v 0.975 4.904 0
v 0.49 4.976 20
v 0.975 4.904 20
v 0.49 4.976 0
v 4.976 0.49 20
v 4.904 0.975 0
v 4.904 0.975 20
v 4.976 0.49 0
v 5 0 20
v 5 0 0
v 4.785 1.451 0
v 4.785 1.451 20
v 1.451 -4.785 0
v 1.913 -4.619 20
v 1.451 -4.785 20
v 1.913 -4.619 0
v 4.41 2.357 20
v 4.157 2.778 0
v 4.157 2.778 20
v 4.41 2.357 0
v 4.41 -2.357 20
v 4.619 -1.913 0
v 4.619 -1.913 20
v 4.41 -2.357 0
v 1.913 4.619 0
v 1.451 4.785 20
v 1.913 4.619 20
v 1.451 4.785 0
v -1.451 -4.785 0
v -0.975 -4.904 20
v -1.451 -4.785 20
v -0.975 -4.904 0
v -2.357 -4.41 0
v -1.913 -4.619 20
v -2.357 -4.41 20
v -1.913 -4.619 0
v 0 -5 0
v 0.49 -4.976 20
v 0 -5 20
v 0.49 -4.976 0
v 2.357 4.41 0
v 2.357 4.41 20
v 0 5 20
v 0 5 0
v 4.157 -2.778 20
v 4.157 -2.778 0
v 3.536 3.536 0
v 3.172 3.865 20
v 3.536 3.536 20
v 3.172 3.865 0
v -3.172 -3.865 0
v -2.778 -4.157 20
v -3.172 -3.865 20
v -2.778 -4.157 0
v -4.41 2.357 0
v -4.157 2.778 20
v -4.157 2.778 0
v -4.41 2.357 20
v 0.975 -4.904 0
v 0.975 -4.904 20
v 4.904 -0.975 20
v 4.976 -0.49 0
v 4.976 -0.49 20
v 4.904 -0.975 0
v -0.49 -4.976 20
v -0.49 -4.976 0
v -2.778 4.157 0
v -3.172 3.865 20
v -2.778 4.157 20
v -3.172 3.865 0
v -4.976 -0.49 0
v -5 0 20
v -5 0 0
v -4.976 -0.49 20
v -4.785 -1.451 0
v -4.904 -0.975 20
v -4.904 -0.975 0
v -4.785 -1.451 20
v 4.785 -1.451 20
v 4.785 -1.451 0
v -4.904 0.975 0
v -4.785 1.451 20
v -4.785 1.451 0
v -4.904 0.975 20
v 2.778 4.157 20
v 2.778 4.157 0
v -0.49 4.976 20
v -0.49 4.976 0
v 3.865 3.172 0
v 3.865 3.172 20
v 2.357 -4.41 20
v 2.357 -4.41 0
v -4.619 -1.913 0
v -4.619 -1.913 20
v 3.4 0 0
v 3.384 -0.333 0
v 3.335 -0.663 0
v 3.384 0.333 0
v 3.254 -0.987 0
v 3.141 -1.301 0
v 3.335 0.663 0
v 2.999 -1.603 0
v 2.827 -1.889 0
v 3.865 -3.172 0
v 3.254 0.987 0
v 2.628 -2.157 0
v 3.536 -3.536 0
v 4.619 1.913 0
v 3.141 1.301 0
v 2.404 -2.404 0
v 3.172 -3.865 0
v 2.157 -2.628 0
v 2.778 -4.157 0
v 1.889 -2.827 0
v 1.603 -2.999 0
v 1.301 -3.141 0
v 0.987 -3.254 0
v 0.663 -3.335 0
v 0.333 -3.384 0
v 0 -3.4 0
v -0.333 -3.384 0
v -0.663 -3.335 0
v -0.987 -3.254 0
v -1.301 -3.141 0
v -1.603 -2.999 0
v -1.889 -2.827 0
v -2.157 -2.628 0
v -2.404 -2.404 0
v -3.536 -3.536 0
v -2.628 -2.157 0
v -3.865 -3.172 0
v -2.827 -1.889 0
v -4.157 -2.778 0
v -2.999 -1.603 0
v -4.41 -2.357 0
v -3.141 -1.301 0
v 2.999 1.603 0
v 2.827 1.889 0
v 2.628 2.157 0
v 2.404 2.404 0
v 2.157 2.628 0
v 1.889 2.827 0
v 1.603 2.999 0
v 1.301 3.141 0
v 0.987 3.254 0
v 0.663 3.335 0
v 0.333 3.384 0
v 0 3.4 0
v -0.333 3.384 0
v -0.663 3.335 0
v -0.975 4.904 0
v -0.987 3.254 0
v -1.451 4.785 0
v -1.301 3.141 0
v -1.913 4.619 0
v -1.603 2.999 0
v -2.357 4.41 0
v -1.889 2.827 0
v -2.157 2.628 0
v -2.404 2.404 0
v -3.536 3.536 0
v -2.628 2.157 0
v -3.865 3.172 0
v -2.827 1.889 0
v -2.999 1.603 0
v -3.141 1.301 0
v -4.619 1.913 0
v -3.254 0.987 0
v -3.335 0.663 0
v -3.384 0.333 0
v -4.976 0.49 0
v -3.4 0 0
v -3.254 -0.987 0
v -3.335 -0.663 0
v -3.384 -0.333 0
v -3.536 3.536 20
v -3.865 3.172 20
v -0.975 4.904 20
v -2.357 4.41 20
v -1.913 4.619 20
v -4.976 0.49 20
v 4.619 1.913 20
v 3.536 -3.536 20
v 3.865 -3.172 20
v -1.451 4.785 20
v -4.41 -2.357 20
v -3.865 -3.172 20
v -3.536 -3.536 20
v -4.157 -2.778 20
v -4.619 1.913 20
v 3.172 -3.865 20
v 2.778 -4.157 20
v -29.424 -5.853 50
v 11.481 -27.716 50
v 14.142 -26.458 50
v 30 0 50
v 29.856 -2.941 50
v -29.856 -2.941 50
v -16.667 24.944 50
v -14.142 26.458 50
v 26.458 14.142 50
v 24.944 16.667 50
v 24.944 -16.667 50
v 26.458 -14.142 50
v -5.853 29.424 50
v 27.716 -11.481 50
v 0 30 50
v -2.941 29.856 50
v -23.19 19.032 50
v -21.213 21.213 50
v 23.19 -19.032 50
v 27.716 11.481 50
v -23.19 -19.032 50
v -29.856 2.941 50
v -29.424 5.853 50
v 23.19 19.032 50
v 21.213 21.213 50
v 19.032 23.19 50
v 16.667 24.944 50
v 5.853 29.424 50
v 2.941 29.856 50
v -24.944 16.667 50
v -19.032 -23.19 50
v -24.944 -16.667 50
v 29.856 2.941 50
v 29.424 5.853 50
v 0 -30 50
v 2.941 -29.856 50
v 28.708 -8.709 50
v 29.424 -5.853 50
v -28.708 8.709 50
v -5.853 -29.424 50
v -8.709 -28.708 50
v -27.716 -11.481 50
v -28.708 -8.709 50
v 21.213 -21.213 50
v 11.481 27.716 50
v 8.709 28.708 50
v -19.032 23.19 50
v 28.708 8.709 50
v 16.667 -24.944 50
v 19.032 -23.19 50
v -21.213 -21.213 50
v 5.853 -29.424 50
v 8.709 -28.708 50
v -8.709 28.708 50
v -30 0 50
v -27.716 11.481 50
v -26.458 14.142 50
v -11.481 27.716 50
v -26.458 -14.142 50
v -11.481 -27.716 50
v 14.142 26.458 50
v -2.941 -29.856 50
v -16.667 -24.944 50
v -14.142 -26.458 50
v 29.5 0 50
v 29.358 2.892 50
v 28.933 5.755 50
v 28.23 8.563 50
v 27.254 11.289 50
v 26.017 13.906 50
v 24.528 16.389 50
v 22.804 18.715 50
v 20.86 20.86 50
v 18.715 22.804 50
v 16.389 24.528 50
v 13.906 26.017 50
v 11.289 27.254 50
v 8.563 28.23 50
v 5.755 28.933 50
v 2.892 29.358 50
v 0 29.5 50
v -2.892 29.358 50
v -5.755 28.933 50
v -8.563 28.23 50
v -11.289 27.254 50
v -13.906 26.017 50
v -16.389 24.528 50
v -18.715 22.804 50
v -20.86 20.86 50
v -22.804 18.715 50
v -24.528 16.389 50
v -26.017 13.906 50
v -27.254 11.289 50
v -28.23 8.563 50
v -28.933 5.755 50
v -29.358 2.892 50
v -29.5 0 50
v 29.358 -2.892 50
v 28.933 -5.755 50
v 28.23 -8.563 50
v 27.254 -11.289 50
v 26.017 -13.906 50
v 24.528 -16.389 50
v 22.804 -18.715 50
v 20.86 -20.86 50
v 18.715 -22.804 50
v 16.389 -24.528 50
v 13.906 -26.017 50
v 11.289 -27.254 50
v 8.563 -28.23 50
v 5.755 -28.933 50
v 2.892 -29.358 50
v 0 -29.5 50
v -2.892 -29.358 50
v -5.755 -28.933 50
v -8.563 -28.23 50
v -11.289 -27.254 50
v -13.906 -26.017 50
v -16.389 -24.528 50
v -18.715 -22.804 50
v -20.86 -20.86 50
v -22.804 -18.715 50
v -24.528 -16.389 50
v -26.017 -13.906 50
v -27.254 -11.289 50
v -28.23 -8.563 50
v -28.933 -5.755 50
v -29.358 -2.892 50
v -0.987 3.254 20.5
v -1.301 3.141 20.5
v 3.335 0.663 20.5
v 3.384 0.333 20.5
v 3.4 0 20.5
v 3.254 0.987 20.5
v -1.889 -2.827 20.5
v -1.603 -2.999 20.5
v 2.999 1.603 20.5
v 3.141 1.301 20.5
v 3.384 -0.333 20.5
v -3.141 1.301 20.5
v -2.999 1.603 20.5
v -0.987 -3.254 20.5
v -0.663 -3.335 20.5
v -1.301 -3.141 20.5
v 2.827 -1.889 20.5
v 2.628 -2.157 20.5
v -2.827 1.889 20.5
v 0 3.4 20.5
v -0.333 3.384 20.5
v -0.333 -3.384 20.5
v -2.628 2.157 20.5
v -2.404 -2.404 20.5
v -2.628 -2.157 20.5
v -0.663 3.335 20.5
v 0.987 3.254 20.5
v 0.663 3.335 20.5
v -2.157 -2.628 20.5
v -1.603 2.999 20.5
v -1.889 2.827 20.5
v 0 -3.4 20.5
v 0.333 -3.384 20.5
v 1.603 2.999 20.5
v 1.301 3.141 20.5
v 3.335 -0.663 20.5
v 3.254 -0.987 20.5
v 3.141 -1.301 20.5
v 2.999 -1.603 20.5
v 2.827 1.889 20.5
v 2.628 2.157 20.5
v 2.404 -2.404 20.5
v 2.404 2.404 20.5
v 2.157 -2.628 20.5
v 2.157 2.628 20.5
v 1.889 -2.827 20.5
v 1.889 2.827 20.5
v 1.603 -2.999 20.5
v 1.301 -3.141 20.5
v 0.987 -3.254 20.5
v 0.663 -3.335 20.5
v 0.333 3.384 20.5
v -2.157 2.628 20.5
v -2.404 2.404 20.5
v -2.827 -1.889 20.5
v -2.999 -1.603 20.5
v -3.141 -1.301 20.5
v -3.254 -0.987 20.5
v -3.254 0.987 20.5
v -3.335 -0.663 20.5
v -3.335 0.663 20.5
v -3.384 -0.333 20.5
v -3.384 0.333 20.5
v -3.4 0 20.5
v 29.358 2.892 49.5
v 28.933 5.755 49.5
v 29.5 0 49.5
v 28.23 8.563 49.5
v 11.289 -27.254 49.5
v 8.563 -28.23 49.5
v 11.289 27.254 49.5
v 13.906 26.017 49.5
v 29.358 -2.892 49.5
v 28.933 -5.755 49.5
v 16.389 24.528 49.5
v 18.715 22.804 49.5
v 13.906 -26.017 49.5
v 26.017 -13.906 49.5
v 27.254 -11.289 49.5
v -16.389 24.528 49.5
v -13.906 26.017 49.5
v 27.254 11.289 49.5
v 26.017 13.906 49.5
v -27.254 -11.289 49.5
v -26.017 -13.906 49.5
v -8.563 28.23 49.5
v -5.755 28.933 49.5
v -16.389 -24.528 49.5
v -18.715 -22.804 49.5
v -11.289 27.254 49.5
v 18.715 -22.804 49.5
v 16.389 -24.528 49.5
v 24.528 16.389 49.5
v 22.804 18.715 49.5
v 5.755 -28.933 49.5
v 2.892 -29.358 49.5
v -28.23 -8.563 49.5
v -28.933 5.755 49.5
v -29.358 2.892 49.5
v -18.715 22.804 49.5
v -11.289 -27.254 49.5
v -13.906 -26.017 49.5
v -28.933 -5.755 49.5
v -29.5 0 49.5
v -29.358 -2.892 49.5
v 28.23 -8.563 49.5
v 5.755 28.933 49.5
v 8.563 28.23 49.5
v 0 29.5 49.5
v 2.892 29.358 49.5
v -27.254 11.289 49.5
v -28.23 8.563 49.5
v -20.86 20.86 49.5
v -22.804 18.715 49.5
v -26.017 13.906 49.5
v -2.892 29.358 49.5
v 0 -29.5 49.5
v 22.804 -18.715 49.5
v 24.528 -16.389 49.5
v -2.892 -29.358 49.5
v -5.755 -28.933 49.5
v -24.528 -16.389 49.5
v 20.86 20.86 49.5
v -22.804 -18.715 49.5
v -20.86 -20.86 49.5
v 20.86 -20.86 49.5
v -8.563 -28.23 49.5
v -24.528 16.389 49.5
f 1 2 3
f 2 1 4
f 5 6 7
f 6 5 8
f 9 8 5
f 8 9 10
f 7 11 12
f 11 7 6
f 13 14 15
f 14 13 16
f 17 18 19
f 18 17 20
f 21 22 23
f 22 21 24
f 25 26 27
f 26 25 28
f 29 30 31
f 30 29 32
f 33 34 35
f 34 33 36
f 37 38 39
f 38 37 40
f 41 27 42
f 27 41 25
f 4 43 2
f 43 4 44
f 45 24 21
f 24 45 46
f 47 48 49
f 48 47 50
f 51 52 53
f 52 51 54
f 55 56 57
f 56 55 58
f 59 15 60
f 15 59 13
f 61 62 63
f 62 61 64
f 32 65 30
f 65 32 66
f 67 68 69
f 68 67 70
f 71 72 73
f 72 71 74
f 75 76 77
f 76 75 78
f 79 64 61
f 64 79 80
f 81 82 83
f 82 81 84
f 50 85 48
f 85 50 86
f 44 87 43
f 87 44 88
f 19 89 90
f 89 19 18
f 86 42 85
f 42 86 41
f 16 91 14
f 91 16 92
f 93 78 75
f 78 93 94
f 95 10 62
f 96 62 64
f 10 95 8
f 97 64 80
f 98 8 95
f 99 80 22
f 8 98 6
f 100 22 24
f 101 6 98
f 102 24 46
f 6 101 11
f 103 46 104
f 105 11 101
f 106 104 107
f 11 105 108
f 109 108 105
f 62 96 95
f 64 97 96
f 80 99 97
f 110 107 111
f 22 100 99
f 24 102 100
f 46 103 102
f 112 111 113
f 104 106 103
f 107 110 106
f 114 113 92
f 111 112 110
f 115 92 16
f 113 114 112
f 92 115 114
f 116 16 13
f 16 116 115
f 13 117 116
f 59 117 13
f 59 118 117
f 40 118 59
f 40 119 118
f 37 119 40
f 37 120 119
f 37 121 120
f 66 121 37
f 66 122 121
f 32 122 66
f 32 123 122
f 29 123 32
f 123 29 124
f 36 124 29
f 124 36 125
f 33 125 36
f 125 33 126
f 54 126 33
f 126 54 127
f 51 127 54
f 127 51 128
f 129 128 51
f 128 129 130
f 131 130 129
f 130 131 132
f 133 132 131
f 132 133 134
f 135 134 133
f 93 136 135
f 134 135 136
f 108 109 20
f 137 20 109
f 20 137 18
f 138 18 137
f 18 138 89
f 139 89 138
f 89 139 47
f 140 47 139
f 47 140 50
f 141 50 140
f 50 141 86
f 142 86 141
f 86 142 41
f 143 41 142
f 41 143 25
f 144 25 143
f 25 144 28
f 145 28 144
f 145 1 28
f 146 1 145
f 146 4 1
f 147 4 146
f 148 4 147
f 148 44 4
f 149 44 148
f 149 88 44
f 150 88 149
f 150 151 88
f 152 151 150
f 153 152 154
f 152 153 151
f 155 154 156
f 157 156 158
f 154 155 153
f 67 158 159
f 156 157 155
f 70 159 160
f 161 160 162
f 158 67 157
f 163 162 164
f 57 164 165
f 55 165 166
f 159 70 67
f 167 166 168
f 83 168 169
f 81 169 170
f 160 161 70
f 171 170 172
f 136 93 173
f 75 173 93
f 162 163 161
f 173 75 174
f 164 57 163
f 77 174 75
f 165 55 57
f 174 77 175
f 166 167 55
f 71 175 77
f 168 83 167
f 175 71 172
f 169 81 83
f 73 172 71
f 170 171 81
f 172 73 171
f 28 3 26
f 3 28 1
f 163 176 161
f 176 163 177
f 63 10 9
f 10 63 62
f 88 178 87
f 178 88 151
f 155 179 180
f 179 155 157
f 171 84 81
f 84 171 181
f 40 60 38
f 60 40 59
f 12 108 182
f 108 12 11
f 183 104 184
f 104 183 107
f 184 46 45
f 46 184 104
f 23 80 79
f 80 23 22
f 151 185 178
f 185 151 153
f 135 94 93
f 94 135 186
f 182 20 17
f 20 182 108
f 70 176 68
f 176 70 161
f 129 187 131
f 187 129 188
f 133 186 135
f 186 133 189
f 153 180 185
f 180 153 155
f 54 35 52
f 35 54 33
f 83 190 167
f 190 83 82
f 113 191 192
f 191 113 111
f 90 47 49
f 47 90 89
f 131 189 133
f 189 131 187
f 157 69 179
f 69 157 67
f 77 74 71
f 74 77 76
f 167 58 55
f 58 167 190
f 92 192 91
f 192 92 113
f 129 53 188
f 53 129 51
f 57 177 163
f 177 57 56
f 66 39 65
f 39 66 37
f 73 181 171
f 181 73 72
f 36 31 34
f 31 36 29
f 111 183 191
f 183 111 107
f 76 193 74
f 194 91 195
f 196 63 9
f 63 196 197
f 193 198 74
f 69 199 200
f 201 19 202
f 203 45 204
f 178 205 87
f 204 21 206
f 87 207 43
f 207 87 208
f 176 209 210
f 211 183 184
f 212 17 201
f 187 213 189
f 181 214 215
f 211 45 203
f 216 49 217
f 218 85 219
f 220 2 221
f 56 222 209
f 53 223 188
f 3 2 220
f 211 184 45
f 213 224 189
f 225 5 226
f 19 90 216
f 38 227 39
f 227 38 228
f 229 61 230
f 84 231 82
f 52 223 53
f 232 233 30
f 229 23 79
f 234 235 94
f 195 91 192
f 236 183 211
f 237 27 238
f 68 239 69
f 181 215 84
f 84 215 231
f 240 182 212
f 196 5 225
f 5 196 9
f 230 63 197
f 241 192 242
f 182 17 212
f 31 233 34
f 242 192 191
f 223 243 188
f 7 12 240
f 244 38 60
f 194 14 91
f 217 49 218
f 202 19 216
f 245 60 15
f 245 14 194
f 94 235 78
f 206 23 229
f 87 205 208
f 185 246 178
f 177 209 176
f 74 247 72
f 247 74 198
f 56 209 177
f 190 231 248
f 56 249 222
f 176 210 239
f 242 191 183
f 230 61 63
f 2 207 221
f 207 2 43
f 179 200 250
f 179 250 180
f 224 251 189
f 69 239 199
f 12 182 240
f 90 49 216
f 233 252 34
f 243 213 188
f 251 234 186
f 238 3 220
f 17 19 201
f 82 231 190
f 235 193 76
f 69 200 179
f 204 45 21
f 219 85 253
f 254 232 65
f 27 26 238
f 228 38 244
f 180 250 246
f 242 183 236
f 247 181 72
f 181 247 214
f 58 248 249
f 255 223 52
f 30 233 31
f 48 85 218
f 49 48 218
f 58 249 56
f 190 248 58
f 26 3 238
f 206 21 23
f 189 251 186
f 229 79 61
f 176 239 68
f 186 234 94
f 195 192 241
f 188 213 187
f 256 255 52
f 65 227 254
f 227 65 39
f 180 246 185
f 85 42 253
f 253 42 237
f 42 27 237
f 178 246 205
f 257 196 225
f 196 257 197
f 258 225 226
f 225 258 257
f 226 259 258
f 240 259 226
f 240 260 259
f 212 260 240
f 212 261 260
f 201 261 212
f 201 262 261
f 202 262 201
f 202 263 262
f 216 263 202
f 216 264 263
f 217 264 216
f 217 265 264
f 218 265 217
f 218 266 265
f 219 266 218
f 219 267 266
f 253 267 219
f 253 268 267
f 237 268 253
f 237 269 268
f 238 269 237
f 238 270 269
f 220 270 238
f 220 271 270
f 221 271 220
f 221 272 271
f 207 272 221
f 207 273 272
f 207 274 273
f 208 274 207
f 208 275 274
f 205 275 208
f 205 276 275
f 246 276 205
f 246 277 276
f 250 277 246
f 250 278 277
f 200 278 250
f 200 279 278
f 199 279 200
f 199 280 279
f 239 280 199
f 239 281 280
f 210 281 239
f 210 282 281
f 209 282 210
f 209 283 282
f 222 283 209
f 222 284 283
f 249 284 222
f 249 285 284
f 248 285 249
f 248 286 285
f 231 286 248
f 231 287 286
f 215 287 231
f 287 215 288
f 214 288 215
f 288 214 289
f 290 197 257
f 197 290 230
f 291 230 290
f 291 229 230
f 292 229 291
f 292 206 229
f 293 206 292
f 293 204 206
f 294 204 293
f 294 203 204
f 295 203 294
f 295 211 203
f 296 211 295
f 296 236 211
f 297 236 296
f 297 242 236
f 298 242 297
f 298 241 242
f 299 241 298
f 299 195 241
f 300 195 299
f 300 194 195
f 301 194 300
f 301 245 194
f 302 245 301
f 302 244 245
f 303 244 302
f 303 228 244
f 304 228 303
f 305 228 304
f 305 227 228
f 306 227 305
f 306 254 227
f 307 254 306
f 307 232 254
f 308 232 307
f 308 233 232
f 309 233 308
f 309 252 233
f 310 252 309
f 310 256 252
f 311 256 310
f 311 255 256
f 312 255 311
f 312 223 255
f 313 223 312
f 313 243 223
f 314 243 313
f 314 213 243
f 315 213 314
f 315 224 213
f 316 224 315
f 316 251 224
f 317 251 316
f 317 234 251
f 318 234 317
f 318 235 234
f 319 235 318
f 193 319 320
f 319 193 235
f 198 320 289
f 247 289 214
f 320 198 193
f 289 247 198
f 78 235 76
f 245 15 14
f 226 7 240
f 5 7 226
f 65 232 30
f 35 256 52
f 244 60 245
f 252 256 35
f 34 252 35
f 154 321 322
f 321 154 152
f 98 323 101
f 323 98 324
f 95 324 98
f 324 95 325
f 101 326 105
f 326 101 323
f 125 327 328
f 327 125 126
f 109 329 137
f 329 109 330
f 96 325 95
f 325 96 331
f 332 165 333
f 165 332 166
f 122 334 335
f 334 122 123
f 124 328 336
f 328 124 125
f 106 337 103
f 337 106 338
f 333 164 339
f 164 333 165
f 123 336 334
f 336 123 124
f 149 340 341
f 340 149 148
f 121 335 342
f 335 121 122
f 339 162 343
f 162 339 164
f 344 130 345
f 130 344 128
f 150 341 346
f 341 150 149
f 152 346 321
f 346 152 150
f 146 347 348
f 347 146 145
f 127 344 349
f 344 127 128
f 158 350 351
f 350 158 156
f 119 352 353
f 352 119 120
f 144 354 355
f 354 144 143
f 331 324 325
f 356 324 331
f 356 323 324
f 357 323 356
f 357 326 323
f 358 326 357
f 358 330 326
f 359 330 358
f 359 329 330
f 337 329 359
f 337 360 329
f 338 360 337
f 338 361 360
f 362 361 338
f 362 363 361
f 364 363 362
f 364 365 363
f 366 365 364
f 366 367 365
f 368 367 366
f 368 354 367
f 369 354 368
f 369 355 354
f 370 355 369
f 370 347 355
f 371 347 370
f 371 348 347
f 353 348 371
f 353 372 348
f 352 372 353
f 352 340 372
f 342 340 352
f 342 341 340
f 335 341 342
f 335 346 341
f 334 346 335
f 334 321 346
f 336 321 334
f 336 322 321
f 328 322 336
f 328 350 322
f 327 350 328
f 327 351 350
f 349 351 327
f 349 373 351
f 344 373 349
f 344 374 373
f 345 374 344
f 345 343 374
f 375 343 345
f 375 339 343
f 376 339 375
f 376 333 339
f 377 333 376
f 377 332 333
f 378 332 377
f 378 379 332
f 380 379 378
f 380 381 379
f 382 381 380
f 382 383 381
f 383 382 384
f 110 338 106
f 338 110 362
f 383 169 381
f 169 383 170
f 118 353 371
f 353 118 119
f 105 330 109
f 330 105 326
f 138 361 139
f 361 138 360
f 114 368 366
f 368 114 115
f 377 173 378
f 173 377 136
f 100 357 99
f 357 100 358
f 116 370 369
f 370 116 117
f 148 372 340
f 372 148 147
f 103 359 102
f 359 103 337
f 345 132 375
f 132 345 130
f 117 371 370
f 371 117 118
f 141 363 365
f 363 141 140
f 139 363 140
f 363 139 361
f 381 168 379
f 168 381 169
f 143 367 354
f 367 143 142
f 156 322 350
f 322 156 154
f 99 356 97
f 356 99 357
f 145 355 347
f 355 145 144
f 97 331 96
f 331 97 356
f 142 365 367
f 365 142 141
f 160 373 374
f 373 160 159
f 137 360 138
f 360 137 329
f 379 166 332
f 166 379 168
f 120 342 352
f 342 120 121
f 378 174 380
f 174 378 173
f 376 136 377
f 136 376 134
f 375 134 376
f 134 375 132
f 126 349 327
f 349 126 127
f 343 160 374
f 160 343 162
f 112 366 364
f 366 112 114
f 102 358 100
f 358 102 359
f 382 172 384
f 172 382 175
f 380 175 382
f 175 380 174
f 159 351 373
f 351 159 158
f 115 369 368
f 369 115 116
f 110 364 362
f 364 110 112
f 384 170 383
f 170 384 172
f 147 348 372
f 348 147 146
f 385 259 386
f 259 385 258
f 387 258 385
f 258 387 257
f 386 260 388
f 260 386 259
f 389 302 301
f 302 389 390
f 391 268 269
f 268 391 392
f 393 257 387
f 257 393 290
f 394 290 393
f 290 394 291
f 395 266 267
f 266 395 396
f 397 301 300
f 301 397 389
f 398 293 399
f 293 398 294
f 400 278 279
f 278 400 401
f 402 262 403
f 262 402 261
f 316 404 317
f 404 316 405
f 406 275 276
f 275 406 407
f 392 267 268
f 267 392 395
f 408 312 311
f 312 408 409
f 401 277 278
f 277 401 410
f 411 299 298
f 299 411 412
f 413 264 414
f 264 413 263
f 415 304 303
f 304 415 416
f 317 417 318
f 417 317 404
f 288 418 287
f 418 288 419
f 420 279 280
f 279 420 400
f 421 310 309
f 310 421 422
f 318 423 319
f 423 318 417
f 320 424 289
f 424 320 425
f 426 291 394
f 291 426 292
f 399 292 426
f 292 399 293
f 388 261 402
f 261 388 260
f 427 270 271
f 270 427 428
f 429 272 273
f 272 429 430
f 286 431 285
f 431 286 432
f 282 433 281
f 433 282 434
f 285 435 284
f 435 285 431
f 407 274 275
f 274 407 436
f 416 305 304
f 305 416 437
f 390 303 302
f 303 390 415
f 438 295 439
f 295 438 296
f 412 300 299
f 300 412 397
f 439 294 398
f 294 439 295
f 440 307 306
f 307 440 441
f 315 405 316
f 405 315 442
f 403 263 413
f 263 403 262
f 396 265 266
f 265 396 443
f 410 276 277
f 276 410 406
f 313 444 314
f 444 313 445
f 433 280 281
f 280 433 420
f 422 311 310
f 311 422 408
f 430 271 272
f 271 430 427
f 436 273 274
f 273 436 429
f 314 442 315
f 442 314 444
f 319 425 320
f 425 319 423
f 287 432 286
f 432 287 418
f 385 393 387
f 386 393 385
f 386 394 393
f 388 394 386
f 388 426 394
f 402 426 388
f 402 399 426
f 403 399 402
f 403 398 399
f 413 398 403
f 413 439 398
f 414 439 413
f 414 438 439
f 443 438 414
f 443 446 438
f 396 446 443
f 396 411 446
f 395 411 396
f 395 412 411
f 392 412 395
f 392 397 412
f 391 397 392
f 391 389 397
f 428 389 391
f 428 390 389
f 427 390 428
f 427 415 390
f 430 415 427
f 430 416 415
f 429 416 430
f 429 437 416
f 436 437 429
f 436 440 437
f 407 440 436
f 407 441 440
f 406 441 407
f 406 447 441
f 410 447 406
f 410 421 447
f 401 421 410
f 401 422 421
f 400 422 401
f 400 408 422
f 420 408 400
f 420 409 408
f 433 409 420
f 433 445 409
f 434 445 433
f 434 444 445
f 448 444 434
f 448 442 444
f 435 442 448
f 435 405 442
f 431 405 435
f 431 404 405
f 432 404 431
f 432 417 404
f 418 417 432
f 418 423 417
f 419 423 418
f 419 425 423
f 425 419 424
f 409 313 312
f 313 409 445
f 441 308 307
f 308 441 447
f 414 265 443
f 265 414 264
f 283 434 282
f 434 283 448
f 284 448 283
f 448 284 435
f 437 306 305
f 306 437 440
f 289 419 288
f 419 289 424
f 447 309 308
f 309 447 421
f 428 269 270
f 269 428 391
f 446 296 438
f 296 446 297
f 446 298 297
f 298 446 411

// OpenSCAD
// Funnel with spout - printed upright, wide opening at the top
// Units: mm. Wall thickness: 1.6 mm.

$fn = 64;

// ---- Spout ----
spout_od     = 10;    // spout outer diameter
spout_length = 20;    // spout length (z = 0 to z = 20)
spout_bore   = spout_od - 2 * 1.6;  // bore = 6.8 mm

// ---- Cone / funnel body ----
cone_top_d   = 60;    // rim outer diameter at z = 50
cone_bottom_d = 10;   // cone outer diameter at z = 20 (spout top)
cone_h       = 30;    // cone height (z = 20 to z = 50)

// ---- Cut clearance ----
eps = 0.5;            // extension past cut faces

// Derived
cone_top_z   = spout_length + cone_h;   // 50

difference() {
    union() {
        // Spout (tube)
        cylinder(h = spout_length, d = spout_od);

        // Cone: 10 mm at z = 20, 60 mm at z = 50
        translate([0, 0, spout_length])
            cylinder(h = cone_h, d1 = cone_bottom_d, d2 = cone_top_d);
    }

    // Bore through the spout
    translate([0, 0, -eps])
        cylinder(h = spout_length + 2 * eps, d = spout_bore);

    // Open top rim
    translate([0, 0, cone_top_z - eps])
        cylinder(h = cone_top_d, d = cone_top_d - 2 * eps);
}
